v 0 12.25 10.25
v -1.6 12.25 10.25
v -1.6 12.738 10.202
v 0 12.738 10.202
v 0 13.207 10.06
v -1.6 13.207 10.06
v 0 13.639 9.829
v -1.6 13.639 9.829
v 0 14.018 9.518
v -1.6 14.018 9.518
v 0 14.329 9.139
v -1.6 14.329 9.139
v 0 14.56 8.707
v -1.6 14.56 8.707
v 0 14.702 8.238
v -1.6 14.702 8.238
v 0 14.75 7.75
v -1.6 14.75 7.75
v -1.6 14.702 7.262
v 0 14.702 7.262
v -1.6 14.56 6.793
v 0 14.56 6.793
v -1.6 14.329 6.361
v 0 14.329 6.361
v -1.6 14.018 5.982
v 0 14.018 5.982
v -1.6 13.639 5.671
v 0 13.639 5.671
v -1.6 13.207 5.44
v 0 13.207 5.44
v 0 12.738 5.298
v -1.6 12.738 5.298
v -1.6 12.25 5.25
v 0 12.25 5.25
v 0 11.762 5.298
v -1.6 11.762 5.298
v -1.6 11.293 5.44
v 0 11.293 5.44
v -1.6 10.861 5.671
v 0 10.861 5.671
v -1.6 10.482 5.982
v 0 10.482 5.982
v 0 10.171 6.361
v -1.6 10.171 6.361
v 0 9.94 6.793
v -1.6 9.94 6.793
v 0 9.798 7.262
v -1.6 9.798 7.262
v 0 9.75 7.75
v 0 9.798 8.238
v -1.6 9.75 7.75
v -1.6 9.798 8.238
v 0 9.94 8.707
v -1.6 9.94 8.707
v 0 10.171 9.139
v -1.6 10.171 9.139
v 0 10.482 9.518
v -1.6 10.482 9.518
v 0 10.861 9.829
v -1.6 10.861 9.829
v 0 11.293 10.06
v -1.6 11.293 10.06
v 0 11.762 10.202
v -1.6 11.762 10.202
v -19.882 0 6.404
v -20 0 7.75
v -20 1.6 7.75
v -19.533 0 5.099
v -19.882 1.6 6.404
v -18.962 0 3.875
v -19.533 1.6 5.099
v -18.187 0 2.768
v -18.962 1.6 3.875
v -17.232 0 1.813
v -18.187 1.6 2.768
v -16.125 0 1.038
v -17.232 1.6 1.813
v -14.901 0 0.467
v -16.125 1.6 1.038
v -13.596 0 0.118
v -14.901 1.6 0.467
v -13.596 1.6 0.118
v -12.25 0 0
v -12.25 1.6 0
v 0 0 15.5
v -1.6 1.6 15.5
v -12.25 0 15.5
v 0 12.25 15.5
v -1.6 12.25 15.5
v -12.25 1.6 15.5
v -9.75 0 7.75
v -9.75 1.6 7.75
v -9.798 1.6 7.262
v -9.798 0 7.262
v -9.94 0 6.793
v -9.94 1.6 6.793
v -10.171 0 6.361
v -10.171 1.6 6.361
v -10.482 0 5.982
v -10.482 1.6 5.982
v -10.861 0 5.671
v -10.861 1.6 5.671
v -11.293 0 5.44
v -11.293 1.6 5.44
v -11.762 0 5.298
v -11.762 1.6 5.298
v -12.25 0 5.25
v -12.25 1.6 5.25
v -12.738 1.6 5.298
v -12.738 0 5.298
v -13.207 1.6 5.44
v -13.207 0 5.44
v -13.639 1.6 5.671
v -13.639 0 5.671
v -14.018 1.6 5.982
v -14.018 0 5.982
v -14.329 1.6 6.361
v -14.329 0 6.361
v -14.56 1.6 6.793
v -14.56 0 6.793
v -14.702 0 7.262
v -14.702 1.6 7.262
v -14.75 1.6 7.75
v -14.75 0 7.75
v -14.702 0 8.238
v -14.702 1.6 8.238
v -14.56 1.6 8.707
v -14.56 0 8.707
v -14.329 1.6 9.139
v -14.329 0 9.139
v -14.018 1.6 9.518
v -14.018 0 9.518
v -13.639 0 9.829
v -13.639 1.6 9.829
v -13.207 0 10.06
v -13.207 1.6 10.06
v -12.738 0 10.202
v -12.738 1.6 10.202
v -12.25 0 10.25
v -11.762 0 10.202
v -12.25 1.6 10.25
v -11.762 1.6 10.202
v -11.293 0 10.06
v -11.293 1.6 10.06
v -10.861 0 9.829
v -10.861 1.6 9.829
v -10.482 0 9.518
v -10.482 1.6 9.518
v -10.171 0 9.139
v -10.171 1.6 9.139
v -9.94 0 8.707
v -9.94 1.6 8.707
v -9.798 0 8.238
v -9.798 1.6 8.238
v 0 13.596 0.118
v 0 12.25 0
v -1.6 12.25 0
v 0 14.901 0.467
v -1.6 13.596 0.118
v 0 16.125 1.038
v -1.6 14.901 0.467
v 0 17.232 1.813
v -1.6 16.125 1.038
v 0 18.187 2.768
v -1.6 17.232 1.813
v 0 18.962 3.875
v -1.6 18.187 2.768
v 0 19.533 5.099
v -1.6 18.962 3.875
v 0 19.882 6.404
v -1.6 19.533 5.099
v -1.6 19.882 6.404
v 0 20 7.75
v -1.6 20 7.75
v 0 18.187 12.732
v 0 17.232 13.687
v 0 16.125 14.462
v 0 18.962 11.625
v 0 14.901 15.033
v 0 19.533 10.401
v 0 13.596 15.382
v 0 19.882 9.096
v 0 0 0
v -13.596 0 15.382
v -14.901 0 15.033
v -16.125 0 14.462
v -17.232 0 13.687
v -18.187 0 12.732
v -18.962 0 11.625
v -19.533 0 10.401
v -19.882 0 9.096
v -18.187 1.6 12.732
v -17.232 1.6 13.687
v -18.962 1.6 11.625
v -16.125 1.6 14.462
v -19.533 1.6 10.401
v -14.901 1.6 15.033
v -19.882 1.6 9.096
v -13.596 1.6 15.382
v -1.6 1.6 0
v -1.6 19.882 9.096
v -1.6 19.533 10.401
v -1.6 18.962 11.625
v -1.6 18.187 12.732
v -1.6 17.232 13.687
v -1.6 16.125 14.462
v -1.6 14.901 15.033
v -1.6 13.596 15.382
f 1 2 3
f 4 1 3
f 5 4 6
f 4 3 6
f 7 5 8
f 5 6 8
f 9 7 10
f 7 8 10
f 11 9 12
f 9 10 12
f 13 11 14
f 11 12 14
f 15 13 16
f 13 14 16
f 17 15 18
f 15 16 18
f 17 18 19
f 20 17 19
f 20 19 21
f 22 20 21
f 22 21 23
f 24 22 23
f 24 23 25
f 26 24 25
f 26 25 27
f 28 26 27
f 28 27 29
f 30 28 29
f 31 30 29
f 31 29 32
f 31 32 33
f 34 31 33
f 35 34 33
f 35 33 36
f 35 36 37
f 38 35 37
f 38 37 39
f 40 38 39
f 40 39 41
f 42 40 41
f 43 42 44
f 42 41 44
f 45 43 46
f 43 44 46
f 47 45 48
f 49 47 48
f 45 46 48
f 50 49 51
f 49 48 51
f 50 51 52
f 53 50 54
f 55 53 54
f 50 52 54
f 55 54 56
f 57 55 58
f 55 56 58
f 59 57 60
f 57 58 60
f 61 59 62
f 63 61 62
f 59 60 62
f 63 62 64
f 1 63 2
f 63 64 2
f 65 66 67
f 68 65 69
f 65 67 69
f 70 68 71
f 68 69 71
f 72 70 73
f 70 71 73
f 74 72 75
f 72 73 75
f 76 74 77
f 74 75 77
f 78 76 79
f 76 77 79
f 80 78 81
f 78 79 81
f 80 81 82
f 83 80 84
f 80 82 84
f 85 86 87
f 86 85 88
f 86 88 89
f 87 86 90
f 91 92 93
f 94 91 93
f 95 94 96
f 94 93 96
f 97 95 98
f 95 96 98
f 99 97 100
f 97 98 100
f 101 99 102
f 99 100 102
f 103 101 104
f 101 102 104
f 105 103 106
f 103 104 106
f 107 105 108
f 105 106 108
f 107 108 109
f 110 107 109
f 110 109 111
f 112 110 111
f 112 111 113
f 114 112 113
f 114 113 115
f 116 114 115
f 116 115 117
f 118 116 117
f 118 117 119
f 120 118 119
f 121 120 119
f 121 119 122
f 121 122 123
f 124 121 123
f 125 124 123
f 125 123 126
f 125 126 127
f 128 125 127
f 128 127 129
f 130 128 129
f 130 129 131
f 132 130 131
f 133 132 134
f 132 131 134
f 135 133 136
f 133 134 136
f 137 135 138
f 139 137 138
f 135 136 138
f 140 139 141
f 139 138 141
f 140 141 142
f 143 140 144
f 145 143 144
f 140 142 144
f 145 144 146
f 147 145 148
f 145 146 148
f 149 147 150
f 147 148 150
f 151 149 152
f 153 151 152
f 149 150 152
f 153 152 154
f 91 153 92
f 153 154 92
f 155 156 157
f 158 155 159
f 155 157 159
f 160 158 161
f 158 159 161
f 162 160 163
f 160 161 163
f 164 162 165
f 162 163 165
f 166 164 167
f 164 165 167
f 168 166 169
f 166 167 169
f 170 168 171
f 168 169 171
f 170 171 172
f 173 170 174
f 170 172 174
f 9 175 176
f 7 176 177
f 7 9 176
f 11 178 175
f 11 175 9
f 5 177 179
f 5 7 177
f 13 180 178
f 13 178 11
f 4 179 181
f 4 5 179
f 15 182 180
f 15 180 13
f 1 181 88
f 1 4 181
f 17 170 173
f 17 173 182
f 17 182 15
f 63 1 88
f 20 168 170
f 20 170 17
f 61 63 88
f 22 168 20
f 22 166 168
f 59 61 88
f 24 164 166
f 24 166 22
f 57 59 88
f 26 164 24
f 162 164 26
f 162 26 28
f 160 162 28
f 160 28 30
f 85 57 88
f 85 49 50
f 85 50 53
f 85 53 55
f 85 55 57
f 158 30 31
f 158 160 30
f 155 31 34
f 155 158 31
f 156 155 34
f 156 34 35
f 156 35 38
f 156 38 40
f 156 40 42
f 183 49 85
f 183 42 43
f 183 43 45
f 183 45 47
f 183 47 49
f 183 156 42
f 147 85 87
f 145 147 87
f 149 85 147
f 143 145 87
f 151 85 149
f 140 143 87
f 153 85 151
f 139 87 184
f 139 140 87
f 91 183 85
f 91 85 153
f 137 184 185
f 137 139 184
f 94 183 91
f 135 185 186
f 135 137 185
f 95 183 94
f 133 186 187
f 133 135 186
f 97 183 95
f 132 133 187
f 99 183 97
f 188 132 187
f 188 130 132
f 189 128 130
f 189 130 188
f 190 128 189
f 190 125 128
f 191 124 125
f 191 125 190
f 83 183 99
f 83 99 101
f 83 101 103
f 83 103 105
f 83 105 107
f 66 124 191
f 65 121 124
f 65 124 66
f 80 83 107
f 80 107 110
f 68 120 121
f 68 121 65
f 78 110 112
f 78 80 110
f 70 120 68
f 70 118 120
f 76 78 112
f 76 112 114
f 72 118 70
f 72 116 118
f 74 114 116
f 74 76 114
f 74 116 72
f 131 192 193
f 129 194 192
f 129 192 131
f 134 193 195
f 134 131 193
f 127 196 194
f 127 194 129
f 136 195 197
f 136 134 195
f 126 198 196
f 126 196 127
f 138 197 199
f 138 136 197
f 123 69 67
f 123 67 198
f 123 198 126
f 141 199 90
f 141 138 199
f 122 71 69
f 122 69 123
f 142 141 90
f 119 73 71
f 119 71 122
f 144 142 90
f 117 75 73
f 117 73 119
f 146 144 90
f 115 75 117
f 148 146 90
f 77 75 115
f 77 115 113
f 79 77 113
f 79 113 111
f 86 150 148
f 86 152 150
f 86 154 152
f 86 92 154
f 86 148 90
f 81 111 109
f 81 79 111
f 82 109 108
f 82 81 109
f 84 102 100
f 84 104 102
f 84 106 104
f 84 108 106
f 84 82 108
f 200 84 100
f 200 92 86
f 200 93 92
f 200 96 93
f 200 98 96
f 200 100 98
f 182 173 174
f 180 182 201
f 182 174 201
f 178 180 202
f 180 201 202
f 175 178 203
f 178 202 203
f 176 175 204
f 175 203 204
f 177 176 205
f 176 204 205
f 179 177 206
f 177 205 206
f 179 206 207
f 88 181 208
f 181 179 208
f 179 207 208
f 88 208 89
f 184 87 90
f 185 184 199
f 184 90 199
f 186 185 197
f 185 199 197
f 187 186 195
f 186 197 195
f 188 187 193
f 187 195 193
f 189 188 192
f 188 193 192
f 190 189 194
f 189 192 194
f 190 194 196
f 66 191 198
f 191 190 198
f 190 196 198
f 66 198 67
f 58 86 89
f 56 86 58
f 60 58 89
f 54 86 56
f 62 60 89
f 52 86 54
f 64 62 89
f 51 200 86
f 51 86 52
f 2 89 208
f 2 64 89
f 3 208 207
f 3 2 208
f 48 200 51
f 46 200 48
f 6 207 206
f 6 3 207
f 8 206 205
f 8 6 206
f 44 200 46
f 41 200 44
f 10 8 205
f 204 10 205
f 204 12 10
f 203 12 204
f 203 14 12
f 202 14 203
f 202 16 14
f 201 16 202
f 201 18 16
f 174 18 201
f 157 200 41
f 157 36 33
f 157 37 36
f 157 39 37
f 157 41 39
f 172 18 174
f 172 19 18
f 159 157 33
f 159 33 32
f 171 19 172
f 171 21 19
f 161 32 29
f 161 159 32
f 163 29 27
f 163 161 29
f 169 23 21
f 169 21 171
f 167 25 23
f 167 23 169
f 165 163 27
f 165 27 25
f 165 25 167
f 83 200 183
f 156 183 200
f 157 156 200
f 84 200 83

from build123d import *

# Parameters (mm, degrees)
EXTRUDE_1_DEPTH     = 15.5
CUT_EXTRUDE_1_DEPTH = 15.5
CUT_EXTRUDE_2_DEPTH = 15.5
SKETCH_4_R          = 2.5
CUT_EXTRUDE_3_DEPTH = 15.5
SKETCH_5_R          = 2.5
CUT_EXTRUDE_4_DEPTH = 15.5


with BuildPart() as part:
    # 草图1 → 凸台-拉伸1 (new body)
    with BuildSketch(Plane.XY):
        Polygon((0, 0), (-20, 0), (-20, 1.6), (-1.6, 1.6), (-1.6, 20), (0, 20), align=None)
    extrude(amount=EXTRUDE_1_DEPTH)

    # 草图2 → 切除-拉伸1 (cut)
    with BuildSketch(Plane.ZY.offset(1.6)):
        with BuildLine():
            Line((0, 20), (0, 12.25))
            ThreePointArc((0, 12.25), (2.269922446, 17.730077554), (7.75, 20))
            Line((7.75, 20), (0, 20))
        make_face()
        with BuildLine():
            ThreePointArc((7.75, 20), (13.230077554, 17.730077554), (15.5, 12.25))
            Line((15.5, 12.25), (15.5, 20))
            Line((15.5, 20), (7.75, 20))
        make_face()
    extrude(amount=-CUT_EXTRUDE_1_DEPTH, mode=Mode.SUBTRACT)

    # 草图3 → 切除-拉伸2 (cut)
    with BuildSketch(Plane(origin=(0, 1.6, 0), x_dir=(1, 0, 0), z_dir=(0, 1, 0))):
        with BuildLine():
            ThreePointArc((-12.25, -15.5), (-17.730077554, -13.230077554), (-20, -7.75))
            Line((-20, -7.75), (-20, -15.5))
            Line((-20, -15.5), (-12.25, -15.5))
        make_face()
        with BuildLine():
            ThreePointArc((-20, -7.75), (-17.730077554, -2.269922446), (-12.25, 0))
            Line((-12.25, 0), (-20, 0))
            Line((-20, 0), (-20, -7.75))
        make_face()
    extrude(amount=-CUT_EXTRUDE_2_DEPTH, mode=Mode.SUBTRACT)

    # 草图4 → 切除-拉伸3 (cut)
    with BuildSketch(Plane.ZY.offset(1.6)):
        with Locations((7.75, 12.25)):
            Circle(SKETCH_4_R)
    extrude(amount=-CUT_EXTRUDE_3_DEPTH, mode=Mode.SUBTRACT)

    # 草图5 → 切除-拉伸4 (cut)
    with BuildSketch(Plane(origin=(0, 1.6, 0), x_dir=(1, 0, 0), z_dir=(0, 1, 0))):
        with Locations((-12.25, -7.75)):
            Circle(SKETCH_5_R)
    extrude(amount=-CUT_EXTRUDE_4_DEPTH, mode=Mode.SUBTRACT)


solid = part.part
